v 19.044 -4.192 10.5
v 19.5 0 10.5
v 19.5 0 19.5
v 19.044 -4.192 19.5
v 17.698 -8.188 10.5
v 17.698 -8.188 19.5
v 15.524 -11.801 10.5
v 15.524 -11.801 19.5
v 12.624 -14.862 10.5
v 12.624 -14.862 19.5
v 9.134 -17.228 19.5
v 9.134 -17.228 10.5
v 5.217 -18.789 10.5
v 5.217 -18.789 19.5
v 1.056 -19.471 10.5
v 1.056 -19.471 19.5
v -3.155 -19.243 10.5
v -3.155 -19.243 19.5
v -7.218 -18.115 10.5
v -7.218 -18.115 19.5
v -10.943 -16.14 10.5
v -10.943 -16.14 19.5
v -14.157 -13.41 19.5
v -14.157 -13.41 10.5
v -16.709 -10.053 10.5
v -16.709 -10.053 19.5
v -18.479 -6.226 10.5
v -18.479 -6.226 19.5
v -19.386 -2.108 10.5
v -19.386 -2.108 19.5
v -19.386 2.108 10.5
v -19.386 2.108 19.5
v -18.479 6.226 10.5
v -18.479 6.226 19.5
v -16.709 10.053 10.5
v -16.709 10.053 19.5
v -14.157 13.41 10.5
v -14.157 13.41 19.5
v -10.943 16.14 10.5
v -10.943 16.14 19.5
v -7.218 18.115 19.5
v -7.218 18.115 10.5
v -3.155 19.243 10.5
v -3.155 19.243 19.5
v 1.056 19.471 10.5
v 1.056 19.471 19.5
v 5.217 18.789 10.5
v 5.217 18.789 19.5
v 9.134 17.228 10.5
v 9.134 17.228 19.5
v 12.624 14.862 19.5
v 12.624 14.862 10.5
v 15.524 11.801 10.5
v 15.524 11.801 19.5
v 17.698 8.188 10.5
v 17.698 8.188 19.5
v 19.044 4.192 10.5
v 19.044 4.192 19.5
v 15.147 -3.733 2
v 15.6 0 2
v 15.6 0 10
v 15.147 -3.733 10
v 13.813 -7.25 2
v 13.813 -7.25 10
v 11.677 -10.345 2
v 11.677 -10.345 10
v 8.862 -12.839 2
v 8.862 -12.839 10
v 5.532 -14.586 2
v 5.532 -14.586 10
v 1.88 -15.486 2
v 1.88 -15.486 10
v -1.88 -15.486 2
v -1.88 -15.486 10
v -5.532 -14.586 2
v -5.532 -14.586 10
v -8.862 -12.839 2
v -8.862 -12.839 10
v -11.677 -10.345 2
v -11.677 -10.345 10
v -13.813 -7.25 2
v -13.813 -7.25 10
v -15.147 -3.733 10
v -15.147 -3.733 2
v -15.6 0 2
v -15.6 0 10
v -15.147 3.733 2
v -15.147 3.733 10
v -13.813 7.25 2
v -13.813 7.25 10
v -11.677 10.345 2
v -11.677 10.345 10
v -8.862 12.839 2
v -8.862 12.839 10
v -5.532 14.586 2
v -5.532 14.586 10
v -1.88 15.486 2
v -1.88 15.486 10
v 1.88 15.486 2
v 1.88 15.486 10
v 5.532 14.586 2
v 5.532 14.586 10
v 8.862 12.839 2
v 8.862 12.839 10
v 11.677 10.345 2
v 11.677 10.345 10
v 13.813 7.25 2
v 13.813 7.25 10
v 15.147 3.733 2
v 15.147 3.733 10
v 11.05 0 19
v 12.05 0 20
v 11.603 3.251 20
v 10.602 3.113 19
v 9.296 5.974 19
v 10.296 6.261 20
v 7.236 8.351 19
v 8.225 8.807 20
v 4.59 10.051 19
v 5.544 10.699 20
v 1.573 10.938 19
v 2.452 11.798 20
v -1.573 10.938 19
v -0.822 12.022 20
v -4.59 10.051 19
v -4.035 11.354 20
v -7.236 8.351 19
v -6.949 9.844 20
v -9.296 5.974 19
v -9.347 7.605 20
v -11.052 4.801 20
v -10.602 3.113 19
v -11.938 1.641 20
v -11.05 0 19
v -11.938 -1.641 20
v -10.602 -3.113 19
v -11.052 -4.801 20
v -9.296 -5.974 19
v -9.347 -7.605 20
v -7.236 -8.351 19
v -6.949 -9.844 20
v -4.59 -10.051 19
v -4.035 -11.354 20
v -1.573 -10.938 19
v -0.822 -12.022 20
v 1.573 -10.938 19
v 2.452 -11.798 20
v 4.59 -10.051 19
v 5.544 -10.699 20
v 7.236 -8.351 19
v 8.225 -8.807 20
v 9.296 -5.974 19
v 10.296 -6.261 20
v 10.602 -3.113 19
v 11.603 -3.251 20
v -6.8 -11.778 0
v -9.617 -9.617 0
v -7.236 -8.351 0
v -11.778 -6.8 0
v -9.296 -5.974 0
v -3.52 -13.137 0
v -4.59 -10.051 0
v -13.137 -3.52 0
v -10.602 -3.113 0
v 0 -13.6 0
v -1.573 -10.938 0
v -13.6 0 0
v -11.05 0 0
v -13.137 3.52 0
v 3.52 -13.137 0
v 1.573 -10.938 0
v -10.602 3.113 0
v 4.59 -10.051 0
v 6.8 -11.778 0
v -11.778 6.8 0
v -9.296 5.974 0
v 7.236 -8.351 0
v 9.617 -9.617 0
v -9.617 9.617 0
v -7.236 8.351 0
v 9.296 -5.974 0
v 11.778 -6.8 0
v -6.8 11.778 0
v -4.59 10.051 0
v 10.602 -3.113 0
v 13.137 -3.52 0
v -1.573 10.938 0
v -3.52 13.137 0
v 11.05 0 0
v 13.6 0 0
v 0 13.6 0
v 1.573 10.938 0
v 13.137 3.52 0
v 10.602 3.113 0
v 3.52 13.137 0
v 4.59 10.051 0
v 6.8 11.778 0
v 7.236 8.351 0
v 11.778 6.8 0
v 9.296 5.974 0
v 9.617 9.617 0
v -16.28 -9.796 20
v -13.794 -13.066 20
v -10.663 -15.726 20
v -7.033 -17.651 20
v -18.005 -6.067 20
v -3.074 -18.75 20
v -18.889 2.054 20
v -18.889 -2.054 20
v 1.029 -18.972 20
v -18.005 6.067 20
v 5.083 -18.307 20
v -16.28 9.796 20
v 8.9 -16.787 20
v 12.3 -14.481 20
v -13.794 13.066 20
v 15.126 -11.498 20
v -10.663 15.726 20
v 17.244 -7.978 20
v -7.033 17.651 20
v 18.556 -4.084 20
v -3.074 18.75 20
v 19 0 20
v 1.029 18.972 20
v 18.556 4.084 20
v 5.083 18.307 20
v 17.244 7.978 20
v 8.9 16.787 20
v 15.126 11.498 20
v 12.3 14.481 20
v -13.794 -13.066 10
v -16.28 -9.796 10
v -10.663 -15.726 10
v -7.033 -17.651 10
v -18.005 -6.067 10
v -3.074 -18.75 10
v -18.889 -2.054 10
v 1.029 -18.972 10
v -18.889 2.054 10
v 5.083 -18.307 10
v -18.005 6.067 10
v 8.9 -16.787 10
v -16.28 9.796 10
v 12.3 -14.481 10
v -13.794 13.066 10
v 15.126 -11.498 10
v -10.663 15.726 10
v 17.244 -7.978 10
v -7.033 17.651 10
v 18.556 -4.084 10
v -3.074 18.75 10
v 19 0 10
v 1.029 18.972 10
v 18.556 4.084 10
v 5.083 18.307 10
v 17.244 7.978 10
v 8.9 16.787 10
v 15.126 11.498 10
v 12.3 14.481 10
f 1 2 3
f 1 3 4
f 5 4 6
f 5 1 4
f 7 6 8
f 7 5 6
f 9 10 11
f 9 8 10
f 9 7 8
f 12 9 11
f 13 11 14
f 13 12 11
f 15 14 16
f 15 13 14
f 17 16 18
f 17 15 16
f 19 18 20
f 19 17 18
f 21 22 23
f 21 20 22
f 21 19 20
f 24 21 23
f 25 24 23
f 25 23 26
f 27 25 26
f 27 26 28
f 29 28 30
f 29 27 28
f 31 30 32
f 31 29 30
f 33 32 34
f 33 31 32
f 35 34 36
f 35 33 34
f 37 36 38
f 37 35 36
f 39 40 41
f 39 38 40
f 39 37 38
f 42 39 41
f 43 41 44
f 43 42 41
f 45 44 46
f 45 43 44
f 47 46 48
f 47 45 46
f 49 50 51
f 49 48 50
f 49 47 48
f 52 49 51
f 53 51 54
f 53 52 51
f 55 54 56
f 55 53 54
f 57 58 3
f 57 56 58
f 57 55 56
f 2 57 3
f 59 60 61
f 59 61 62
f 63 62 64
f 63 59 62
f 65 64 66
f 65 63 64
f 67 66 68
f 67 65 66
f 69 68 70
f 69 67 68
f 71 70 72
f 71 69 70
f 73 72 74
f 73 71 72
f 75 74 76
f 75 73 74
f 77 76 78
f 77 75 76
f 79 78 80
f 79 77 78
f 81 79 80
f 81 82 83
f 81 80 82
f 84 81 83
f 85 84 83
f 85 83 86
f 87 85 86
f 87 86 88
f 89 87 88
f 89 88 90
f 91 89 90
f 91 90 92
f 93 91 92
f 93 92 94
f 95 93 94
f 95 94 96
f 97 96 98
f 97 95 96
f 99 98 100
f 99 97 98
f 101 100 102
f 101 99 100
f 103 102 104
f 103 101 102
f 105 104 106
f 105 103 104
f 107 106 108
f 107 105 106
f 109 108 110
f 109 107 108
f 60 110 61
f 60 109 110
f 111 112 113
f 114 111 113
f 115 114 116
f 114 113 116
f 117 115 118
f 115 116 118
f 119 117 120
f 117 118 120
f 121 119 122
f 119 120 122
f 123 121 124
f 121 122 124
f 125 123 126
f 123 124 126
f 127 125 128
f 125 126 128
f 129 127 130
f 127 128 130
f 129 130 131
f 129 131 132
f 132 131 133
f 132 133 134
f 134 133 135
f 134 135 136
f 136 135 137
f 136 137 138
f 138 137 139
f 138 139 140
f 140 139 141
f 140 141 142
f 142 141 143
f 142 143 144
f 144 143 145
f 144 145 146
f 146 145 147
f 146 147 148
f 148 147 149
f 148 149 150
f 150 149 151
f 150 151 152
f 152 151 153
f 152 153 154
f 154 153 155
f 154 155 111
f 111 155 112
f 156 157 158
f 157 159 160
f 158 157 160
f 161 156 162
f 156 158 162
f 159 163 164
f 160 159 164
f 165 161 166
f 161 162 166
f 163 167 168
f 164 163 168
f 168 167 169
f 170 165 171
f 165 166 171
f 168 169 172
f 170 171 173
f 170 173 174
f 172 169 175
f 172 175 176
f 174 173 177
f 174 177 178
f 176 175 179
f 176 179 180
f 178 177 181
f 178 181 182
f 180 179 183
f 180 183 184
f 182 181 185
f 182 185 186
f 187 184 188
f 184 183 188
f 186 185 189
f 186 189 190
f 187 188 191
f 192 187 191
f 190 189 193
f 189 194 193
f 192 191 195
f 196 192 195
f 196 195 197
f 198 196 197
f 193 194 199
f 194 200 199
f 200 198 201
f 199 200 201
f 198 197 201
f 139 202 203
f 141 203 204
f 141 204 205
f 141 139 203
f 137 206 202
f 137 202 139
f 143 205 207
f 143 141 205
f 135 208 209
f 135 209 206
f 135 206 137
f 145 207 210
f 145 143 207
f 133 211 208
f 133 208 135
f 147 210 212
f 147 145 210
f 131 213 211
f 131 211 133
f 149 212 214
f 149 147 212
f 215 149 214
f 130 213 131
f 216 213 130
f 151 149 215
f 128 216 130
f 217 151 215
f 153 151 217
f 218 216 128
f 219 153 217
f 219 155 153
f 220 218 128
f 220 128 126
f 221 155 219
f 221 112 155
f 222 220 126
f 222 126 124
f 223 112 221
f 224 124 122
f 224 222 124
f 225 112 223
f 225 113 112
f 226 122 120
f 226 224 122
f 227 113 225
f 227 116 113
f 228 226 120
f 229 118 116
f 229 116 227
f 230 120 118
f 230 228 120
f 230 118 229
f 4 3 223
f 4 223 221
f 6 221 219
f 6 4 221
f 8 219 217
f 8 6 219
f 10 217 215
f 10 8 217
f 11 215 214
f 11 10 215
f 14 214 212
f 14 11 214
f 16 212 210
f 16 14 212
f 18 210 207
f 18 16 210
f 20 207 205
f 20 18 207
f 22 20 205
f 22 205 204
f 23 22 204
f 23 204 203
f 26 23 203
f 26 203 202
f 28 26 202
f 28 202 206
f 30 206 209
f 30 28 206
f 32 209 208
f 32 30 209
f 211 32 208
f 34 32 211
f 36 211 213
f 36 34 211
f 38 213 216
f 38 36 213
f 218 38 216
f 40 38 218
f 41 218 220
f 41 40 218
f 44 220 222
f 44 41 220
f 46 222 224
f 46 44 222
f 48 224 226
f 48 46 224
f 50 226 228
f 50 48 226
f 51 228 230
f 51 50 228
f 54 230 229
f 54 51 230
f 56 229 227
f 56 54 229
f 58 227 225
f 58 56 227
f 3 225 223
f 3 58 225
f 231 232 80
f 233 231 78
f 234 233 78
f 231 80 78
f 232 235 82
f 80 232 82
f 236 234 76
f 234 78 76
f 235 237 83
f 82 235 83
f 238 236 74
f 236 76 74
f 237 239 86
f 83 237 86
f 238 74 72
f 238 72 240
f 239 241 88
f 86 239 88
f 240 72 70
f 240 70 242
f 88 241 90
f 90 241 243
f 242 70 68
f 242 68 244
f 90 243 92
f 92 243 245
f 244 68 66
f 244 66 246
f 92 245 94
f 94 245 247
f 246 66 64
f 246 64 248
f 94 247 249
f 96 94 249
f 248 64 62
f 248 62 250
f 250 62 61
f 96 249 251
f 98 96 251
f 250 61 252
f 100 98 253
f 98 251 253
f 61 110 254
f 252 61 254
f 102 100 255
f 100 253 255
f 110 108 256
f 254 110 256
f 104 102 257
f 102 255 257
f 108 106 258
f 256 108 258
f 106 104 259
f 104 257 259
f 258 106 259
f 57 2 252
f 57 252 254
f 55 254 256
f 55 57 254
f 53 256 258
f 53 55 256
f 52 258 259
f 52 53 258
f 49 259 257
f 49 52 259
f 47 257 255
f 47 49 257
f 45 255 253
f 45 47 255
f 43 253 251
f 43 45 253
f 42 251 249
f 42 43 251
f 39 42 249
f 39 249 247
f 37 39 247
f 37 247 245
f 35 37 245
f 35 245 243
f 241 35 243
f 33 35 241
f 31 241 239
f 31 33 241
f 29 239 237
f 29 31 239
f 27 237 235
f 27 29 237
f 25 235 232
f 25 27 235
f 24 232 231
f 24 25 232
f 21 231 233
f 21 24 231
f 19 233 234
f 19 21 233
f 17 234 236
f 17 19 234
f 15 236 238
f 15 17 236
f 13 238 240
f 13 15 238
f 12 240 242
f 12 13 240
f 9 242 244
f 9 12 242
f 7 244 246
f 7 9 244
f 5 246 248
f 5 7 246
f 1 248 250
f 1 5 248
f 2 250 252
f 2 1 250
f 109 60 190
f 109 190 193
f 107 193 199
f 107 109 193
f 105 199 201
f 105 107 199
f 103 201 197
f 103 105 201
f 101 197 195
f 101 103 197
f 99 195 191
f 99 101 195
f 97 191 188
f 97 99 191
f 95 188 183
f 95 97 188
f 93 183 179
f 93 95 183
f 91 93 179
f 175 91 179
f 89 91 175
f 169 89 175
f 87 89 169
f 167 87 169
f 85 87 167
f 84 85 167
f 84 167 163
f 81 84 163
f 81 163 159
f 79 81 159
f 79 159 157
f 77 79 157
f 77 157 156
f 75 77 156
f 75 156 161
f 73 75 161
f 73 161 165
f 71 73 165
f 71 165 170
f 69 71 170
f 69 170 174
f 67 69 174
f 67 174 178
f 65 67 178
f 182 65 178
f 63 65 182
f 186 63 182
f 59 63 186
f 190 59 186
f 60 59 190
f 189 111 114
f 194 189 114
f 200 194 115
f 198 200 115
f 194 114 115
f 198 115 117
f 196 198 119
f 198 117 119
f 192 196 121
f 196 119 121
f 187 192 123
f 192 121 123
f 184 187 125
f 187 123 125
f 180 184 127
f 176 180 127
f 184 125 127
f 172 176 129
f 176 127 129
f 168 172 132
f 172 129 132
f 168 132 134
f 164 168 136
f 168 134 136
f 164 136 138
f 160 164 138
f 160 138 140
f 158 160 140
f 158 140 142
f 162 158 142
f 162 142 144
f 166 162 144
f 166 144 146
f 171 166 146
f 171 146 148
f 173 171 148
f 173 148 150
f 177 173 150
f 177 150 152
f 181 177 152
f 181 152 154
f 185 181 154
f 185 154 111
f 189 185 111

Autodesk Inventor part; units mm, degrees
ref_plane "YZ Plane" through (0, 0, 0) normal (1, 0, 0) x (0, 1, 0)
ref_plane "XZ Plane" through (0, 0, 0) normal (0, 1, 0) x (-1, 0, 0)
ref_plane "XY Plane" through (0, 0, 0) normal (0, 0, 1) x (1, 0, 0)
sketch "スケッチ1" plane through (0, 0, 0) normal (0, 0, 1) x (1, 0, 0)
  circle A0 centre (0, 0) radius 15.6
  dimension "d0" = 31.2
extrude "押し出し1" add sketch "スケッチ1" along normal blind 10
sketch "スケッチ2" plane through (0, 0, 10) normal (0, 0, 1) x (1, 0, 0)
  circle A0 centre (0, 0) radius 15.6 projected
  circle A1 centre (0, 0) radius 19.5
  dimension "d3" = 39
extrude "押し出し2" add sketch "スケッチ2" along normal blind 10 contours A0 | A1
chamfer "面取り1" distance 2 angle 45 1 edges at (-15.6, 0, 0)
chamfer "面取り2" distance 0.5 angle 45 2 edges at (-19.5, 0, 20) (-19.5, 0, 10)
sketch "スケッチ3" plane through (0, 0, 20) normal (0, 0, 1) x (1, 0, 0)
  circle A0 centre (0, 0) radius 19 projected
  circle A1 centre (0, 0) radius 11.05
  dimension "d12" = 22.1
extrude "押し出し3" cut sketch "スケッチ3" against normal through all contours A1
chamfer "面取り3" distance 1 angle 45 1 edges at (-11.05, 0, 20)
properties part number "Print_Parts_A3" material "PC/ABS プラスチック"
